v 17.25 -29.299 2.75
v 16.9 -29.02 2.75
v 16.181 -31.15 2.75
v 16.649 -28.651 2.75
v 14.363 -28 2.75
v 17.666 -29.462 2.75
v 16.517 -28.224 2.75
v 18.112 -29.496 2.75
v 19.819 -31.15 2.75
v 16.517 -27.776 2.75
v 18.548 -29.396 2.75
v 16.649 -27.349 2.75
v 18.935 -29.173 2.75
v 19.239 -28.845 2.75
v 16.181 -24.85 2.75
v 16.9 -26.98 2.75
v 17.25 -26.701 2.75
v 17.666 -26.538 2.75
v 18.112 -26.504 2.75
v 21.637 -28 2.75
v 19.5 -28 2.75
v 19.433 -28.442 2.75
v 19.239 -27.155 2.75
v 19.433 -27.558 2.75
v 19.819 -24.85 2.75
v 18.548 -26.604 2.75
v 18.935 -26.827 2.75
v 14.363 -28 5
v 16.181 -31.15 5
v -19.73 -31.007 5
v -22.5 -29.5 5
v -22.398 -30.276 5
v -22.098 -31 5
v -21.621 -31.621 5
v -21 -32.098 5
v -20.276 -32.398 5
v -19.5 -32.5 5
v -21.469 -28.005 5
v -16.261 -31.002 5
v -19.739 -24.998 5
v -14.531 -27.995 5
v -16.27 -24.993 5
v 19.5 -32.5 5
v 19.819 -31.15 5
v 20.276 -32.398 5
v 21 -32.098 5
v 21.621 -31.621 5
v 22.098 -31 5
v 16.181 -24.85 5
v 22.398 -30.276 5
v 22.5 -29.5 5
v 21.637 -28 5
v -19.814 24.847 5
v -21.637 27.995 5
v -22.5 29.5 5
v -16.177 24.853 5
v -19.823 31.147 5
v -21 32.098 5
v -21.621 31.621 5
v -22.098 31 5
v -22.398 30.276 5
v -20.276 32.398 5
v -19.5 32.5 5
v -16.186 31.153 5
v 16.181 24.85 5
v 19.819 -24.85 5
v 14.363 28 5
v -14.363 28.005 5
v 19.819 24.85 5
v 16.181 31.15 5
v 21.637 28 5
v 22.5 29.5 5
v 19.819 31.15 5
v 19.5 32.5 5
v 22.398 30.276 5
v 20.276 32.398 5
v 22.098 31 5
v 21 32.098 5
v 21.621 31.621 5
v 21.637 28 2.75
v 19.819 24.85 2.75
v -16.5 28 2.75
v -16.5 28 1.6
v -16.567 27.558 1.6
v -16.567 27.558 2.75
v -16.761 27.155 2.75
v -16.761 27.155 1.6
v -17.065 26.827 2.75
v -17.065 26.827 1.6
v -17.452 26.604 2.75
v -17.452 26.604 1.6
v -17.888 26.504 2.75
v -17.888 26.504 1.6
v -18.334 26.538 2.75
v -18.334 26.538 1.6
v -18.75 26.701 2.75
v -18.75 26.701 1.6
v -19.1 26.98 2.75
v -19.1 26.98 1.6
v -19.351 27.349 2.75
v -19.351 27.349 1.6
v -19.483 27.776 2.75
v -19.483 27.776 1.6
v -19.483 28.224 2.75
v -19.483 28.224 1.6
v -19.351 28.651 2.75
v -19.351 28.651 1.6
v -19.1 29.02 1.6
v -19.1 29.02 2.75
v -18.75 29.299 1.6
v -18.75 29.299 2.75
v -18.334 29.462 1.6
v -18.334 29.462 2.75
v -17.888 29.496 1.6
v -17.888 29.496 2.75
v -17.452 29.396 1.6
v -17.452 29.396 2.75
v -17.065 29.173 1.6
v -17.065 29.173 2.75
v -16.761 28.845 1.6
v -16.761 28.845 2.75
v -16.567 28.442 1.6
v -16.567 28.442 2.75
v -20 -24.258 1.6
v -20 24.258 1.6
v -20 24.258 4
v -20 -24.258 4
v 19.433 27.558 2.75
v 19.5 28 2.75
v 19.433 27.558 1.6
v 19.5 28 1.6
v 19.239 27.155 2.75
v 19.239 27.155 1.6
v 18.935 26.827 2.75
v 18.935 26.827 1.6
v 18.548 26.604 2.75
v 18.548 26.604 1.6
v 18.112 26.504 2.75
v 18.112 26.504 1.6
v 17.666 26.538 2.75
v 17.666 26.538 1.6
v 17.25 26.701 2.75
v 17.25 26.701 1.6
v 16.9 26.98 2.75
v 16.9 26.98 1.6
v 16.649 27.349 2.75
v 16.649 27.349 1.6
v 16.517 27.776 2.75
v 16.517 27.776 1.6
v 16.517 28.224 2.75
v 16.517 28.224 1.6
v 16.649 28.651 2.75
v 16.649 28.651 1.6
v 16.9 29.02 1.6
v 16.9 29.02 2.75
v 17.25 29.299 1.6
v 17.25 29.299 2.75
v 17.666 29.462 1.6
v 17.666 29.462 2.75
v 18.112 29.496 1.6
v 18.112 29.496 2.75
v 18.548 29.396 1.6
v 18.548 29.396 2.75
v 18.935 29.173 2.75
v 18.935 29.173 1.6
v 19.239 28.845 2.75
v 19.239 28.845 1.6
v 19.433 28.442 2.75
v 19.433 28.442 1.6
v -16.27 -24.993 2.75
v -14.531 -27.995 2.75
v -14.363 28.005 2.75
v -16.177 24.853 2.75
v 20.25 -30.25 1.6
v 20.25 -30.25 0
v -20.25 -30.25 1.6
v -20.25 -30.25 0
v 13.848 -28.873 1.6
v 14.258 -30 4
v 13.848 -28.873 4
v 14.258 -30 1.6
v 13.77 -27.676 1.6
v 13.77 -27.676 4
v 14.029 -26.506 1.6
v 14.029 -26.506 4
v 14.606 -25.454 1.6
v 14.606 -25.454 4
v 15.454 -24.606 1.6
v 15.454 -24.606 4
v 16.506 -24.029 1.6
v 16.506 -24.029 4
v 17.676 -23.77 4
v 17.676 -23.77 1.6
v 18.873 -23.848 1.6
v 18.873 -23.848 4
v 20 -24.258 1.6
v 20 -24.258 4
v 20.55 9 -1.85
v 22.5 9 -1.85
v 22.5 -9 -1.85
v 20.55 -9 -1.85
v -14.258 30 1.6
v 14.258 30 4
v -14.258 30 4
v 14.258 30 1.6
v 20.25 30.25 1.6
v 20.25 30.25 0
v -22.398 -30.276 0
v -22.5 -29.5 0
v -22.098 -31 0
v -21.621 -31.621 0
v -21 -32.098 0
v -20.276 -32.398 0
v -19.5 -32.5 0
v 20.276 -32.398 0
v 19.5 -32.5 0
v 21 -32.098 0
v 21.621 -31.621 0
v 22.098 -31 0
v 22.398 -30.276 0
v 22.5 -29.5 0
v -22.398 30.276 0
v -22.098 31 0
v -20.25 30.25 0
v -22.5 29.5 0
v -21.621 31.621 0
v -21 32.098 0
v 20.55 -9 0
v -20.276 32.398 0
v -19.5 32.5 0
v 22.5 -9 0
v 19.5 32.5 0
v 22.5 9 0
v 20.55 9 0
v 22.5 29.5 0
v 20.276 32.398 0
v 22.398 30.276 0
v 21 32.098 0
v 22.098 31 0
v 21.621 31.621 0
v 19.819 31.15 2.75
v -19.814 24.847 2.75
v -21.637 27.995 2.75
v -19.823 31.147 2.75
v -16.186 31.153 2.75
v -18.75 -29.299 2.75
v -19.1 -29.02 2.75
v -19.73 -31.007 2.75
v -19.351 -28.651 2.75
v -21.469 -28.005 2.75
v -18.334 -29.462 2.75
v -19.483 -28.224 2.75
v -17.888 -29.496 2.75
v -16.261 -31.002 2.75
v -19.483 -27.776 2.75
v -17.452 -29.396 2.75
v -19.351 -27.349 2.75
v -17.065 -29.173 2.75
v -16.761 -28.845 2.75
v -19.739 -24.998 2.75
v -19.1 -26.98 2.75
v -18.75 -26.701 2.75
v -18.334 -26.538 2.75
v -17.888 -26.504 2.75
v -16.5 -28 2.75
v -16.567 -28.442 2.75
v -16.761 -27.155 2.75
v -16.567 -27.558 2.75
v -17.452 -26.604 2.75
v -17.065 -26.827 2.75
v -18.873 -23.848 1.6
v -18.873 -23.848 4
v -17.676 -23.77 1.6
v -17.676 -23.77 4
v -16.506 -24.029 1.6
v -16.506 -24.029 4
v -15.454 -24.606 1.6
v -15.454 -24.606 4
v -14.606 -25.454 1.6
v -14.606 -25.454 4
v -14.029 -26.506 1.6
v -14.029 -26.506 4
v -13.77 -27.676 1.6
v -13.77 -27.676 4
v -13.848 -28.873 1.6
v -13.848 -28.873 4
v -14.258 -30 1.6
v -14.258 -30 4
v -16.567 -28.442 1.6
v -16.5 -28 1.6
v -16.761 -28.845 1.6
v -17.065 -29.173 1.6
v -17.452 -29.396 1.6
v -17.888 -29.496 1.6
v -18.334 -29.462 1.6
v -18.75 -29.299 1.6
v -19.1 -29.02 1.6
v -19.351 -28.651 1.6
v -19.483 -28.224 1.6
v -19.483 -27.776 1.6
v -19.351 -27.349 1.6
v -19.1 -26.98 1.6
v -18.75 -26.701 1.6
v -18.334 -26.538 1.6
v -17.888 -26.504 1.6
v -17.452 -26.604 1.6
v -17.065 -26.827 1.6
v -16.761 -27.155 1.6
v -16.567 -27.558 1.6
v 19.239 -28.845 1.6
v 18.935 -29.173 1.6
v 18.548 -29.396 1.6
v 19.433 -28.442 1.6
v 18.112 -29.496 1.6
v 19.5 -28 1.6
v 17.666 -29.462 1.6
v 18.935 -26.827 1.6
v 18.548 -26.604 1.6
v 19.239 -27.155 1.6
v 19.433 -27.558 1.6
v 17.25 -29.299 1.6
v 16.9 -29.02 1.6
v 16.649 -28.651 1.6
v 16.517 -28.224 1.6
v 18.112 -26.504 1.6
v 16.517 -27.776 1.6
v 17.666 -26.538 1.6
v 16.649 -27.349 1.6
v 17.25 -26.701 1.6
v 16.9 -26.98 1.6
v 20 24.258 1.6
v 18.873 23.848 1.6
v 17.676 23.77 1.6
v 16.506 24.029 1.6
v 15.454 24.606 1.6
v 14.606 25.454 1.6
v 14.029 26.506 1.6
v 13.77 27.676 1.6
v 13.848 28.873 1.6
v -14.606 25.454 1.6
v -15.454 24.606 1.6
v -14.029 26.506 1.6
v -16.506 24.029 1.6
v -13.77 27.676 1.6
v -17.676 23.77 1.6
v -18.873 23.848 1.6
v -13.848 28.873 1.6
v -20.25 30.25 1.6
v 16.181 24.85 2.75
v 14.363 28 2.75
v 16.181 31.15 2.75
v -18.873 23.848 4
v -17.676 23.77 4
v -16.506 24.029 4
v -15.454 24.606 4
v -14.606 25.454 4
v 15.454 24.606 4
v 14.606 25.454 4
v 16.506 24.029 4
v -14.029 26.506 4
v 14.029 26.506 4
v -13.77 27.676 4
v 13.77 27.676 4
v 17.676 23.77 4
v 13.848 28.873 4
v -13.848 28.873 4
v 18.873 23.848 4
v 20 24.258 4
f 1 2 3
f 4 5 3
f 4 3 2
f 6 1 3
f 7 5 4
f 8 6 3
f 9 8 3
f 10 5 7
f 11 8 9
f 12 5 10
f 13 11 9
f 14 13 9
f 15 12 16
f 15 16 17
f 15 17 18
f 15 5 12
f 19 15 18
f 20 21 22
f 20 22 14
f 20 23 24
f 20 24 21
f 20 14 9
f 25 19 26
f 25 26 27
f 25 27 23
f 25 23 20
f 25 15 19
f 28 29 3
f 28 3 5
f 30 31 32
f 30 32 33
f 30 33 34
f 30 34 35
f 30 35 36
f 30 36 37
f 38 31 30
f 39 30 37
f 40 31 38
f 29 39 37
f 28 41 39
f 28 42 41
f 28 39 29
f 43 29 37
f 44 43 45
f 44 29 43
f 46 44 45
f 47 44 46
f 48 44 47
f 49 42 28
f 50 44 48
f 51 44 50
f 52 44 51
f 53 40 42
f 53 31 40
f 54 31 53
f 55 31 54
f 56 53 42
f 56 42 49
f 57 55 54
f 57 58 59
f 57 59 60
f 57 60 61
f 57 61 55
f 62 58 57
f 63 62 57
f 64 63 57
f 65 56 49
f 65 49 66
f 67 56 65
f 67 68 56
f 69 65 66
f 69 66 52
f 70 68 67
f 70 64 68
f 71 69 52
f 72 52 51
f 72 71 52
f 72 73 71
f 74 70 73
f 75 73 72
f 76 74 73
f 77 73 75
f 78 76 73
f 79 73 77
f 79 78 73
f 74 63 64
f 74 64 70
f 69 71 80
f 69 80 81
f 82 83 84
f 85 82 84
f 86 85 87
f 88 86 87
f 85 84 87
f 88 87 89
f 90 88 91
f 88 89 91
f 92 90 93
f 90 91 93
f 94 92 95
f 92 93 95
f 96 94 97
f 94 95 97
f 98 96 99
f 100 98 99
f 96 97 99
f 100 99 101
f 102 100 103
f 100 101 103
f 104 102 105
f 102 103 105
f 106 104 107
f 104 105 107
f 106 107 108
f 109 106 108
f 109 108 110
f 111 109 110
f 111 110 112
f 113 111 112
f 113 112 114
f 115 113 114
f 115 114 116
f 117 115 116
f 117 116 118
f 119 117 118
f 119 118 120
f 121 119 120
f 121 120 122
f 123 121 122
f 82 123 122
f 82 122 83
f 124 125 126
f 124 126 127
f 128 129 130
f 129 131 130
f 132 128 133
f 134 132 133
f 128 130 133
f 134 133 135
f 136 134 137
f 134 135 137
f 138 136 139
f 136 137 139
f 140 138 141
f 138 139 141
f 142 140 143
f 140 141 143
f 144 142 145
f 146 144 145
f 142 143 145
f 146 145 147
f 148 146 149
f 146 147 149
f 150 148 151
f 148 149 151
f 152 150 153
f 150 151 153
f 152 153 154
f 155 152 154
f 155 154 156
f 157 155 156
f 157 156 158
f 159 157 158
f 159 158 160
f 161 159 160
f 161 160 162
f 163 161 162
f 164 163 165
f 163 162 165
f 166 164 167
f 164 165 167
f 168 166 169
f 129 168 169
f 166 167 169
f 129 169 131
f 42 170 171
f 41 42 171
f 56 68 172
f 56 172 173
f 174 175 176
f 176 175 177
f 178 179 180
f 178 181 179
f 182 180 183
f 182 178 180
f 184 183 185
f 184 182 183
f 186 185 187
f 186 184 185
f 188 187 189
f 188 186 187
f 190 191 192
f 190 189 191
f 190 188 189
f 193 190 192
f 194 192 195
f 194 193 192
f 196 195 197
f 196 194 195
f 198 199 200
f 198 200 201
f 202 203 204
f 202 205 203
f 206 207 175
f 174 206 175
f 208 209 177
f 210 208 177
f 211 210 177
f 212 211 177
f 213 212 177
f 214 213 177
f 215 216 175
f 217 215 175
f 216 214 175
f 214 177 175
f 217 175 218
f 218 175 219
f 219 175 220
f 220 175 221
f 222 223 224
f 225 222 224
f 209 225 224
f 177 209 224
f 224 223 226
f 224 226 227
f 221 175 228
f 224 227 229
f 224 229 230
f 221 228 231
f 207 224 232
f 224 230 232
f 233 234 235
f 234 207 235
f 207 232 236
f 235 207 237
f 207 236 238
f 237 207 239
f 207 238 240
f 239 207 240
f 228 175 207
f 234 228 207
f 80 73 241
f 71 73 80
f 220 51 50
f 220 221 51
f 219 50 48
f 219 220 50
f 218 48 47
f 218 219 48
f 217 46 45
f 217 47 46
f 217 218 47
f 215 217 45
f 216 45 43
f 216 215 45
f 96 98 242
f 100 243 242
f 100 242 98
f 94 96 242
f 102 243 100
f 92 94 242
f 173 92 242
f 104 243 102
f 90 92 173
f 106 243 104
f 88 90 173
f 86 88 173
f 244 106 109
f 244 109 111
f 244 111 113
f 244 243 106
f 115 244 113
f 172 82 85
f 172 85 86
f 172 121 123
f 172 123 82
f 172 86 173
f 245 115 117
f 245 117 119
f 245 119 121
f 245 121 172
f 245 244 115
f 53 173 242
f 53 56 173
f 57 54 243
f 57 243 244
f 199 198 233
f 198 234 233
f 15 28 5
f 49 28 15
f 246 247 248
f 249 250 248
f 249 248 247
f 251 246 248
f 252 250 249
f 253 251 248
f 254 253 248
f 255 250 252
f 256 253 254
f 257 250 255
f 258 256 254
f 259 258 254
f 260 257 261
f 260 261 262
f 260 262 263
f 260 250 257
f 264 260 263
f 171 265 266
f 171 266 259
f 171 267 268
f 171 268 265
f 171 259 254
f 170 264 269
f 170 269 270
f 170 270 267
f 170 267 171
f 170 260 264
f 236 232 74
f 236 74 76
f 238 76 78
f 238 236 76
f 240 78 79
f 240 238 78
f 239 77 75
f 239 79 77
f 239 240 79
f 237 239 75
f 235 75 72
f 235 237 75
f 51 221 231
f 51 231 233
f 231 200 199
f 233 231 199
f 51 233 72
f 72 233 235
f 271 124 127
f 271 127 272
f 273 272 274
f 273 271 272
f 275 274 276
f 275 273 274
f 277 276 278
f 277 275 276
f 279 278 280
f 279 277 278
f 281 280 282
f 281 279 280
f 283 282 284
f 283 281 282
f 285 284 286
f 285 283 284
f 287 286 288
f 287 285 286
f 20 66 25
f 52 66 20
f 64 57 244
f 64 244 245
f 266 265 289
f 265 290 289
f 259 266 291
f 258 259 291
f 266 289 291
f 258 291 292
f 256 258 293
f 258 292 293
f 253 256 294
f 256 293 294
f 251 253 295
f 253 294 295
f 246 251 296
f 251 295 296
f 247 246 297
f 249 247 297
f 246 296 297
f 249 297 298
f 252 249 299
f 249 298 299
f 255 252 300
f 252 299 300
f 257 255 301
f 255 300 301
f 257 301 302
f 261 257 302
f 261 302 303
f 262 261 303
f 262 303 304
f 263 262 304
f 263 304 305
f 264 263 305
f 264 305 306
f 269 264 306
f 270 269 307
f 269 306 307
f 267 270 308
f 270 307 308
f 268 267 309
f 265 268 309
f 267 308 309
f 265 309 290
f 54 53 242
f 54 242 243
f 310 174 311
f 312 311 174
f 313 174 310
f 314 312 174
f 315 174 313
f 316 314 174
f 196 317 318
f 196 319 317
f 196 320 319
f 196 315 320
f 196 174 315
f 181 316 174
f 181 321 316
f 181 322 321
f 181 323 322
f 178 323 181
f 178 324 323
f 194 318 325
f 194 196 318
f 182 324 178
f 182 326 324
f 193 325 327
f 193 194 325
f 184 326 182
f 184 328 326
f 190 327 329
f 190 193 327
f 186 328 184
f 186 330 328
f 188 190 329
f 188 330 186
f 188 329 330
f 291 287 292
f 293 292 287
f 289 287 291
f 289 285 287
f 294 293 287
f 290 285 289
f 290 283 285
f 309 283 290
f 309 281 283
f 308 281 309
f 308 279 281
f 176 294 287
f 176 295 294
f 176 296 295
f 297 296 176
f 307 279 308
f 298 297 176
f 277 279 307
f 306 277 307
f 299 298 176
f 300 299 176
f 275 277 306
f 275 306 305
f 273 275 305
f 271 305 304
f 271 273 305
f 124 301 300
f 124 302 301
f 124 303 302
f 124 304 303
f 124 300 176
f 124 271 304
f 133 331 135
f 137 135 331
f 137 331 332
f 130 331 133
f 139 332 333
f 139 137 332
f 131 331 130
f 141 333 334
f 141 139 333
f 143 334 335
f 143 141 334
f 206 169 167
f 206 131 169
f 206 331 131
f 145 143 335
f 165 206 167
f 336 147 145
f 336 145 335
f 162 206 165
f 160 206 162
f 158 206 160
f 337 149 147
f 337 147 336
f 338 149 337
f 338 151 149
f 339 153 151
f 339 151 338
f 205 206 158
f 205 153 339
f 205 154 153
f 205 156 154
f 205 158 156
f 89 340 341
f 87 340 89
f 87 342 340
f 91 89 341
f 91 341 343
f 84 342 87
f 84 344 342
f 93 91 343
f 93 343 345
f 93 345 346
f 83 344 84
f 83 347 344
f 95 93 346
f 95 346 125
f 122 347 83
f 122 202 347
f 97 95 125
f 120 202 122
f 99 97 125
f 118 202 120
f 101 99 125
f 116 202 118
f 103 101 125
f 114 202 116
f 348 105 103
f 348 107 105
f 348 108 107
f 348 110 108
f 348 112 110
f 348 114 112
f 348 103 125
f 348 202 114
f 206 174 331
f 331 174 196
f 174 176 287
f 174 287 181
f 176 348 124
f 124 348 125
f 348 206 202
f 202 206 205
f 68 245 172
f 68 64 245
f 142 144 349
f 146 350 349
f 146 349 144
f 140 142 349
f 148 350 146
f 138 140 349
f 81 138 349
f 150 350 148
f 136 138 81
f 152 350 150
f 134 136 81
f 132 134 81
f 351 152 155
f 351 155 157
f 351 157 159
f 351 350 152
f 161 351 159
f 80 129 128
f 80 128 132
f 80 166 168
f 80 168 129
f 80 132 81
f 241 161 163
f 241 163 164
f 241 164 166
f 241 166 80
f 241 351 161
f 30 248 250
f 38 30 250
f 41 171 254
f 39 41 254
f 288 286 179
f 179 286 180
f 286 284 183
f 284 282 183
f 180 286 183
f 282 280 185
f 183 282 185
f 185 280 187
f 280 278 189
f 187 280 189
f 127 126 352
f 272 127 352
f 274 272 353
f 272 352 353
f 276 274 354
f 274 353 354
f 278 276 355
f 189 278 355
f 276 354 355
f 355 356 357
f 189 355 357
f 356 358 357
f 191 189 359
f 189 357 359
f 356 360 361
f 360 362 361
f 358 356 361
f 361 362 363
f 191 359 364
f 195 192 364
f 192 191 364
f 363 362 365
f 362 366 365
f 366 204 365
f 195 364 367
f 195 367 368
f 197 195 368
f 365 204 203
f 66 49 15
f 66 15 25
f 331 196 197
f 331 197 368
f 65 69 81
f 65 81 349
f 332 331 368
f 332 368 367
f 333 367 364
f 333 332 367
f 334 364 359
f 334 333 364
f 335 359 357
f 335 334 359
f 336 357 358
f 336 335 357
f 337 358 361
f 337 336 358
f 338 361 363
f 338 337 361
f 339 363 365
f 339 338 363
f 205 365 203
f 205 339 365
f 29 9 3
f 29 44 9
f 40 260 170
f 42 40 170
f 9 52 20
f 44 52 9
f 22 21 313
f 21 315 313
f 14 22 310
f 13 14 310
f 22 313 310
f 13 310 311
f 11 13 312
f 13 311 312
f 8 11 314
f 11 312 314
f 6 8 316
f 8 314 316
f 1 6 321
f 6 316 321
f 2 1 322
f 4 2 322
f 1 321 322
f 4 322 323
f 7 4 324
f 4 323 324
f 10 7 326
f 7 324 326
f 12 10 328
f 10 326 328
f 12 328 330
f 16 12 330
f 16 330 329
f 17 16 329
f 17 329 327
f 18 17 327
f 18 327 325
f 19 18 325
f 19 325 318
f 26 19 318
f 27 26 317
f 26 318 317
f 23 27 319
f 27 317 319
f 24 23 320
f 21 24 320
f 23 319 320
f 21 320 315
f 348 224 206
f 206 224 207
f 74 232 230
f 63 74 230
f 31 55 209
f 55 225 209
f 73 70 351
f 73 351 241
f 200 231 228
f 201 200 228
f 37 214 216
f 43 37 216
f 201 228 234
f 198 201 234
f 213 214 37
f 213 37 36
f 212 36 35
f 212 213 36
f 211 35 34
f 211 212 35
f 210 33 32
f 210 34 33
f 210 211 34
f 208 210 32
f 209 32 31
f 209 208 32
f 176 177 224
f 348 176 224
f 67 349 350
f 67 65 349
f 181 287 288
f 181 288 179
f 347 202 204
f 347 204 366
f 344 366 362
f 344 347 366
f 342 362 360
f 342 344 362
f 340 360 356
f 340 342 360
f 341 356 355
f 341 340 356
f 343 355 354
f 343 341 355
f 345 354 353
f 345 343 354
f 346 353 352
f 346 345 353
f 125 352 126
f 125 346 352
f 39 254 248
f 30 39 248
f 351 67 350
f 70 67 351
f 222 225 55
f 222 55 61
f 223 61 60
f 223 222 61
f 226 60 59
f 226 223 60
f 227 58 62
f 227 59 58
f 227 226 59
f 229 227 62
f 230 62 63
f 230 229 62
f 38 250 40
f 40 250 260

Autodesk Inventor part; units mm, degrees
ref_plane "YZ Plane" through (0, 0, 0) normal (1, 0, 0) x (0, 1, 0)
ref_plane "XZ Plane" through (0, 0, 0) normal (0, 1, 0) x (-1, 0, 0)
ref_plane "XY Plane" through (0, 0, 0) normal (0, 0, 1) x (1, 0, 0)
ref_plane "РабПлоскость1" through (0, 0, 0) normal (0, 0, 1) x (1, 0, 0)
sketch "Эскиз1" plane through (0, 0, 0) normal (0, 0, 1) x (1, 0, 0)
  line L0 (22.5, 29.5) -> (22.5, 9) projected
  arc A0 (22.5, 29.5) -> (19.5, 32.5) centre (19.5, 29.5) ccw projected
  line L1 (-19.5, 32.5) -> (19.5, 32.5) projected
  arc A1 (-19.5, 32.5) -> (-22.5, 29.5) centre (-19.5, 29.5) ccw projected
  line L2 (-22.5, -29.5) -> (-22.5, 29.5) projected
  arc A2 (-22.5, -29.5) -> (-19.5, -32.5) centre (-19.5, -29.5) ccw projected
  line L3 (19.5, -32.5) -> (-19.5, -32.5) projected
  arc A3 (19.5, -32.5) -> (22.5, -29.5) centre (19.5, -29.5) ccw projected
  line L4 (22.5, -9) -> (22.5, -29.5) projected
  line L5 (20, -9) -> (22.5, -9) projected
  line L6 (20, -25) -> (20, -9) projected
  line L7 (18, -25) -> (20, -25) projected
  arc A4 (18, -25) -> (15, -28) centre (18, -28) ccw projected
  line L8 (15, -30) -> (15, -28) projected
  line L9 (-15, -30) -> (15, -30) projected
  line L10 (-15, -28) -> (-15, -30) projected
  arc A5 (-15, -28) -> (-18, -25) centre (-18, -28) ccw projected
  line L11 (-20, -25) -> (-18, -25) projected
  line L12 (-20, 25) -> (-20, -25) projected
  line L13 (-18, 25) -> (-20, 25) projected
  arc A6 (-18, 25) -> (-15, 28) centre (-18, 28) ccw projected
  line L14 (-15, 30) -> (-15, 28) projected
  line L15 (15, 30) -> (-15, 30) projected
  line L16 (15, 28) -> (15, 30) projected
  arc A7 (15, 28) -> (18, 25) centre (18, 28) ccw projected
  line L17 (20, 25) -> (18, 25) projected
  line L18 (20, 9) -> (20, 25) projected
  line L19 (22.5, 9) -> (20, 9) projected
  circle A8 centre (-18, -28) radius 1.5 projected
  circle A9 centre (-18, 28) radius 1.5 projected
  circle A10 centre (18, 28) radius 1.5 projected
  circle A11 centre (18, -28) radius 1.5 projected
  line L20 (22.5, 9) -> (22.5, -9)
  line L21 (20, 9) -> (20, -9.6142)
  circle A12 centre (18, 28) radius 4.2426
  circle A13 centre (18, -28) radius 4.2426
  circle A14 centre (-18, -28) radius 4.2426
  circle A15 centre (-18, 28) radius 4.2426
  point P0 (0, 0)
  point P1 (-14.2583, -30)
  point P2 (-20, -24.2583)
  point P3 (-20, 24.2583)
  point P4 (-14.2583, 30)
  point P5 (20, -24.2583)
  point P6 (14.2583, -30)
  point P7 (14.2583, 30)
  point P8 (20, 24.2583)
extrude "Выдавливание1" add sketch "Эскиз1" along normal blind 4 contours L0 L19 L18 A12 L15 A15 L12 A14 L9 A13 L6 L5 L4 A3 L3 A2 L2 A1 L1 A0 | L20 L5 L21 L19 | A12 L15 L16 A7 L17 L18 | L18 L17 A7 L16 L15 A12 | A15 L12 L13 A6 L14 L15 | L15 L14 A6 L13 L12 A15 | A13 L9 L8 A4 L7 L6 | L6 L7 A4 L8 L9 A13 | A14 L9 L10 A5 L11 L12 | L12 L11 A5 L10 L9 A14
sketch "Эскиз2" plane through (0, 0, 4) normal (0, 0, 1) x (1, 0, 0)
  circle A0 centre (18, 28) radius 1.5 projected
  circle A1 centre (18, -28) radius 1.5 projected
  circle A2 centre (-18, 28) radius 1.5 projected
  line L0 (16.1813, 24.85) -> (14.3627, 28)
  line L1 (14.3627, 28) -> (16.1813, 31.15)
  line L2 (16.1813, 31.15) -> (19.8187, 31.15)
  line L3 (19.8187, 31.15) -> (21.6373, 28)
  line L4 (21.6373, 28) -> (19.8187, 24.85)
  line L5 (19.8187, 24.85) -> (16.1813, 24.85)
  circle A3 centre (18, -28) radius 1.5 projected
  line L6 (21.6373, -28) -> (19.8187, -31.15)
  line L7 (19.8187, -31.15) -> (16.1813, -31.15)
  line L8 (16.1813, -31.15) -> (14.3627, -28)
  line L9 (14.3627, -28) -> (16.1813, -24.85)
  line L10 (16.1813, -24.85) -> (19.8187, -24.85)
  line L11 (19.8187, -24.85) -> (21.6373, -28)
  line L12 (-14.3627, 28.0054) -> (-16.1766, 24.8527)
  line L13 (-16.1766, 24.8527) -> (-19.8139, 24.8473)
  line L14 (-19.8139, 24.8473) -> (-21.6373, 27.9946)
  line L15 (-21.6373, 27.9946) -> (-19.8234, 31.1473)
  line L16 (-19.8234, 31.1473) -> (-16.1861, 31.1527)
  line L17 (-16.1861, 31.1527) -> (-14.3627, 28.0054)
  line L18 (-16.2701, -24.9933) -> (-14.5312, -27.9948)
  line L19 (-14.5312, -27.9948) -> (-16.2611, -31.0015)
  line L20 (-16.2611, -31.0015) -> (-19.7299, -31.0067)
  line L21 (-19.7299, -31.0067) -> (-21.4688, -28.0052)
  line L22 (-21.4688, -28.0052) -> (-19.7389, -24.9985)
  line L23 (-19.7389, -24.9985) -> (-16.2701, -24.9933)
  line L24 (19.5, 32.5) -> (-19.5, 32.5) projected
  point P0 (0, 0)
  point P1 (-18, -28)
  point P2 (-18, -28)
  dimension "d2" = 6.3
sketch "Эскиз3" plane through (0, 0, 4) normal (0, 0, 1) x (1, 0, 0)
  line L0 (19.5, 32.5) -> (-19.5, 32.5) projected
  arc A0 (22.5, 29.5) -> (19.5, 32.5) centre (19.5, 29.5) ccw projected
  line L1 (22.5, -29.5) -> (22.5, 29.5) projected
  arc A1 (19.5, -32.5) -> (22.5, -29.5) centre (19.5, -29.5) ccw projected
  line L2 (-19.5, -32.5) -> (19.5, -32.5) projected
  arc A2 (-22.5, -29.5) -> (-19.5, -32.5) centre (-19.5, -29.5) ccw projected
  line L3 (-22.5, 29.5) -> (-22.5, -29.5) projected
  arc A3 (-19.5, 32.5) -> (-22.5, 29.5) centre (-19.5, 29.5) ccw projected
  point P0 (0, 0)
extrude "Выдавливание2" add sketch "Эскиз3" along normal blind 1
extrude "Выдавливание3" cut sketch "Эскиз2" along normal blind 1 and the other way blind 1.25 contours A0 | A1 | A2 | L0 L1 L2 L3 L4 L5 | L6 L7 L8 L9 L10 L11 | L12 L13 L14 L15 L16 L17 | L18 L19 L20 L21 L22 L23
sketch "Эскиз4" plane through (0, 0, 0) normal (0, 0, -1) x (-1, 0, 0)
  line L0 (-20.25, -30.25) -> (20.25, -30.25)
  line L1 (20.25, -30.25) -> (20.25, 30.25)
  line L2 (20.25, 30.25) -> (-20.25, 30.25)
  line L3 (-20.25, 30.25) -> (-20.25, -30.25)
  line L4 (-20.25, -30.25) -> (20.25, 30.25) construction
  line L5 (20.25, -30.25) -> (-20.25, 30.25) construction
  point P0 (0, 0)
  dimension "d9" = 40.5
  dimension "d10" = 60.5
extrude "Выдавливание4" cut sketch "Эскиз4" against normal blind 1.6
sketch "Эскиз5" plane through (0, 0, 0) normal (0, 0, -1) x (-1, 0, 0)
  line L0 (-20, 9) -> (-20, -9) projected
  line L1 (-22.5, 29.5) -> (-22.5, -29.5) projected
  line L2 (-22.5, -29.5) -> (-22.5, 29.5) projected
  line L3 (-20, 9) -> (-22.5, 9)
  line L4 (-22.5, 9) -> (-22.5, -9)
  line L5 (-22.5, -9) -> (-20, -9)
  line L6 (-20, -9) -> (-20, 9)
  line L7 (-20.25, -30.25) -> (-20.25, 30.25) projected
  line L8 (-20.25, -9) -> (-20.55, -9)
  line L9 (-20.55, -9) -> (-20.55, 9)
  point P0 (0, 0)
  dimension "d15" = 0.3
extrude "Выдавливание5" add sketch "Эскиз5" along normal blind 1.85 contours L9 L5 L1 L3
properties part number "bottom"
